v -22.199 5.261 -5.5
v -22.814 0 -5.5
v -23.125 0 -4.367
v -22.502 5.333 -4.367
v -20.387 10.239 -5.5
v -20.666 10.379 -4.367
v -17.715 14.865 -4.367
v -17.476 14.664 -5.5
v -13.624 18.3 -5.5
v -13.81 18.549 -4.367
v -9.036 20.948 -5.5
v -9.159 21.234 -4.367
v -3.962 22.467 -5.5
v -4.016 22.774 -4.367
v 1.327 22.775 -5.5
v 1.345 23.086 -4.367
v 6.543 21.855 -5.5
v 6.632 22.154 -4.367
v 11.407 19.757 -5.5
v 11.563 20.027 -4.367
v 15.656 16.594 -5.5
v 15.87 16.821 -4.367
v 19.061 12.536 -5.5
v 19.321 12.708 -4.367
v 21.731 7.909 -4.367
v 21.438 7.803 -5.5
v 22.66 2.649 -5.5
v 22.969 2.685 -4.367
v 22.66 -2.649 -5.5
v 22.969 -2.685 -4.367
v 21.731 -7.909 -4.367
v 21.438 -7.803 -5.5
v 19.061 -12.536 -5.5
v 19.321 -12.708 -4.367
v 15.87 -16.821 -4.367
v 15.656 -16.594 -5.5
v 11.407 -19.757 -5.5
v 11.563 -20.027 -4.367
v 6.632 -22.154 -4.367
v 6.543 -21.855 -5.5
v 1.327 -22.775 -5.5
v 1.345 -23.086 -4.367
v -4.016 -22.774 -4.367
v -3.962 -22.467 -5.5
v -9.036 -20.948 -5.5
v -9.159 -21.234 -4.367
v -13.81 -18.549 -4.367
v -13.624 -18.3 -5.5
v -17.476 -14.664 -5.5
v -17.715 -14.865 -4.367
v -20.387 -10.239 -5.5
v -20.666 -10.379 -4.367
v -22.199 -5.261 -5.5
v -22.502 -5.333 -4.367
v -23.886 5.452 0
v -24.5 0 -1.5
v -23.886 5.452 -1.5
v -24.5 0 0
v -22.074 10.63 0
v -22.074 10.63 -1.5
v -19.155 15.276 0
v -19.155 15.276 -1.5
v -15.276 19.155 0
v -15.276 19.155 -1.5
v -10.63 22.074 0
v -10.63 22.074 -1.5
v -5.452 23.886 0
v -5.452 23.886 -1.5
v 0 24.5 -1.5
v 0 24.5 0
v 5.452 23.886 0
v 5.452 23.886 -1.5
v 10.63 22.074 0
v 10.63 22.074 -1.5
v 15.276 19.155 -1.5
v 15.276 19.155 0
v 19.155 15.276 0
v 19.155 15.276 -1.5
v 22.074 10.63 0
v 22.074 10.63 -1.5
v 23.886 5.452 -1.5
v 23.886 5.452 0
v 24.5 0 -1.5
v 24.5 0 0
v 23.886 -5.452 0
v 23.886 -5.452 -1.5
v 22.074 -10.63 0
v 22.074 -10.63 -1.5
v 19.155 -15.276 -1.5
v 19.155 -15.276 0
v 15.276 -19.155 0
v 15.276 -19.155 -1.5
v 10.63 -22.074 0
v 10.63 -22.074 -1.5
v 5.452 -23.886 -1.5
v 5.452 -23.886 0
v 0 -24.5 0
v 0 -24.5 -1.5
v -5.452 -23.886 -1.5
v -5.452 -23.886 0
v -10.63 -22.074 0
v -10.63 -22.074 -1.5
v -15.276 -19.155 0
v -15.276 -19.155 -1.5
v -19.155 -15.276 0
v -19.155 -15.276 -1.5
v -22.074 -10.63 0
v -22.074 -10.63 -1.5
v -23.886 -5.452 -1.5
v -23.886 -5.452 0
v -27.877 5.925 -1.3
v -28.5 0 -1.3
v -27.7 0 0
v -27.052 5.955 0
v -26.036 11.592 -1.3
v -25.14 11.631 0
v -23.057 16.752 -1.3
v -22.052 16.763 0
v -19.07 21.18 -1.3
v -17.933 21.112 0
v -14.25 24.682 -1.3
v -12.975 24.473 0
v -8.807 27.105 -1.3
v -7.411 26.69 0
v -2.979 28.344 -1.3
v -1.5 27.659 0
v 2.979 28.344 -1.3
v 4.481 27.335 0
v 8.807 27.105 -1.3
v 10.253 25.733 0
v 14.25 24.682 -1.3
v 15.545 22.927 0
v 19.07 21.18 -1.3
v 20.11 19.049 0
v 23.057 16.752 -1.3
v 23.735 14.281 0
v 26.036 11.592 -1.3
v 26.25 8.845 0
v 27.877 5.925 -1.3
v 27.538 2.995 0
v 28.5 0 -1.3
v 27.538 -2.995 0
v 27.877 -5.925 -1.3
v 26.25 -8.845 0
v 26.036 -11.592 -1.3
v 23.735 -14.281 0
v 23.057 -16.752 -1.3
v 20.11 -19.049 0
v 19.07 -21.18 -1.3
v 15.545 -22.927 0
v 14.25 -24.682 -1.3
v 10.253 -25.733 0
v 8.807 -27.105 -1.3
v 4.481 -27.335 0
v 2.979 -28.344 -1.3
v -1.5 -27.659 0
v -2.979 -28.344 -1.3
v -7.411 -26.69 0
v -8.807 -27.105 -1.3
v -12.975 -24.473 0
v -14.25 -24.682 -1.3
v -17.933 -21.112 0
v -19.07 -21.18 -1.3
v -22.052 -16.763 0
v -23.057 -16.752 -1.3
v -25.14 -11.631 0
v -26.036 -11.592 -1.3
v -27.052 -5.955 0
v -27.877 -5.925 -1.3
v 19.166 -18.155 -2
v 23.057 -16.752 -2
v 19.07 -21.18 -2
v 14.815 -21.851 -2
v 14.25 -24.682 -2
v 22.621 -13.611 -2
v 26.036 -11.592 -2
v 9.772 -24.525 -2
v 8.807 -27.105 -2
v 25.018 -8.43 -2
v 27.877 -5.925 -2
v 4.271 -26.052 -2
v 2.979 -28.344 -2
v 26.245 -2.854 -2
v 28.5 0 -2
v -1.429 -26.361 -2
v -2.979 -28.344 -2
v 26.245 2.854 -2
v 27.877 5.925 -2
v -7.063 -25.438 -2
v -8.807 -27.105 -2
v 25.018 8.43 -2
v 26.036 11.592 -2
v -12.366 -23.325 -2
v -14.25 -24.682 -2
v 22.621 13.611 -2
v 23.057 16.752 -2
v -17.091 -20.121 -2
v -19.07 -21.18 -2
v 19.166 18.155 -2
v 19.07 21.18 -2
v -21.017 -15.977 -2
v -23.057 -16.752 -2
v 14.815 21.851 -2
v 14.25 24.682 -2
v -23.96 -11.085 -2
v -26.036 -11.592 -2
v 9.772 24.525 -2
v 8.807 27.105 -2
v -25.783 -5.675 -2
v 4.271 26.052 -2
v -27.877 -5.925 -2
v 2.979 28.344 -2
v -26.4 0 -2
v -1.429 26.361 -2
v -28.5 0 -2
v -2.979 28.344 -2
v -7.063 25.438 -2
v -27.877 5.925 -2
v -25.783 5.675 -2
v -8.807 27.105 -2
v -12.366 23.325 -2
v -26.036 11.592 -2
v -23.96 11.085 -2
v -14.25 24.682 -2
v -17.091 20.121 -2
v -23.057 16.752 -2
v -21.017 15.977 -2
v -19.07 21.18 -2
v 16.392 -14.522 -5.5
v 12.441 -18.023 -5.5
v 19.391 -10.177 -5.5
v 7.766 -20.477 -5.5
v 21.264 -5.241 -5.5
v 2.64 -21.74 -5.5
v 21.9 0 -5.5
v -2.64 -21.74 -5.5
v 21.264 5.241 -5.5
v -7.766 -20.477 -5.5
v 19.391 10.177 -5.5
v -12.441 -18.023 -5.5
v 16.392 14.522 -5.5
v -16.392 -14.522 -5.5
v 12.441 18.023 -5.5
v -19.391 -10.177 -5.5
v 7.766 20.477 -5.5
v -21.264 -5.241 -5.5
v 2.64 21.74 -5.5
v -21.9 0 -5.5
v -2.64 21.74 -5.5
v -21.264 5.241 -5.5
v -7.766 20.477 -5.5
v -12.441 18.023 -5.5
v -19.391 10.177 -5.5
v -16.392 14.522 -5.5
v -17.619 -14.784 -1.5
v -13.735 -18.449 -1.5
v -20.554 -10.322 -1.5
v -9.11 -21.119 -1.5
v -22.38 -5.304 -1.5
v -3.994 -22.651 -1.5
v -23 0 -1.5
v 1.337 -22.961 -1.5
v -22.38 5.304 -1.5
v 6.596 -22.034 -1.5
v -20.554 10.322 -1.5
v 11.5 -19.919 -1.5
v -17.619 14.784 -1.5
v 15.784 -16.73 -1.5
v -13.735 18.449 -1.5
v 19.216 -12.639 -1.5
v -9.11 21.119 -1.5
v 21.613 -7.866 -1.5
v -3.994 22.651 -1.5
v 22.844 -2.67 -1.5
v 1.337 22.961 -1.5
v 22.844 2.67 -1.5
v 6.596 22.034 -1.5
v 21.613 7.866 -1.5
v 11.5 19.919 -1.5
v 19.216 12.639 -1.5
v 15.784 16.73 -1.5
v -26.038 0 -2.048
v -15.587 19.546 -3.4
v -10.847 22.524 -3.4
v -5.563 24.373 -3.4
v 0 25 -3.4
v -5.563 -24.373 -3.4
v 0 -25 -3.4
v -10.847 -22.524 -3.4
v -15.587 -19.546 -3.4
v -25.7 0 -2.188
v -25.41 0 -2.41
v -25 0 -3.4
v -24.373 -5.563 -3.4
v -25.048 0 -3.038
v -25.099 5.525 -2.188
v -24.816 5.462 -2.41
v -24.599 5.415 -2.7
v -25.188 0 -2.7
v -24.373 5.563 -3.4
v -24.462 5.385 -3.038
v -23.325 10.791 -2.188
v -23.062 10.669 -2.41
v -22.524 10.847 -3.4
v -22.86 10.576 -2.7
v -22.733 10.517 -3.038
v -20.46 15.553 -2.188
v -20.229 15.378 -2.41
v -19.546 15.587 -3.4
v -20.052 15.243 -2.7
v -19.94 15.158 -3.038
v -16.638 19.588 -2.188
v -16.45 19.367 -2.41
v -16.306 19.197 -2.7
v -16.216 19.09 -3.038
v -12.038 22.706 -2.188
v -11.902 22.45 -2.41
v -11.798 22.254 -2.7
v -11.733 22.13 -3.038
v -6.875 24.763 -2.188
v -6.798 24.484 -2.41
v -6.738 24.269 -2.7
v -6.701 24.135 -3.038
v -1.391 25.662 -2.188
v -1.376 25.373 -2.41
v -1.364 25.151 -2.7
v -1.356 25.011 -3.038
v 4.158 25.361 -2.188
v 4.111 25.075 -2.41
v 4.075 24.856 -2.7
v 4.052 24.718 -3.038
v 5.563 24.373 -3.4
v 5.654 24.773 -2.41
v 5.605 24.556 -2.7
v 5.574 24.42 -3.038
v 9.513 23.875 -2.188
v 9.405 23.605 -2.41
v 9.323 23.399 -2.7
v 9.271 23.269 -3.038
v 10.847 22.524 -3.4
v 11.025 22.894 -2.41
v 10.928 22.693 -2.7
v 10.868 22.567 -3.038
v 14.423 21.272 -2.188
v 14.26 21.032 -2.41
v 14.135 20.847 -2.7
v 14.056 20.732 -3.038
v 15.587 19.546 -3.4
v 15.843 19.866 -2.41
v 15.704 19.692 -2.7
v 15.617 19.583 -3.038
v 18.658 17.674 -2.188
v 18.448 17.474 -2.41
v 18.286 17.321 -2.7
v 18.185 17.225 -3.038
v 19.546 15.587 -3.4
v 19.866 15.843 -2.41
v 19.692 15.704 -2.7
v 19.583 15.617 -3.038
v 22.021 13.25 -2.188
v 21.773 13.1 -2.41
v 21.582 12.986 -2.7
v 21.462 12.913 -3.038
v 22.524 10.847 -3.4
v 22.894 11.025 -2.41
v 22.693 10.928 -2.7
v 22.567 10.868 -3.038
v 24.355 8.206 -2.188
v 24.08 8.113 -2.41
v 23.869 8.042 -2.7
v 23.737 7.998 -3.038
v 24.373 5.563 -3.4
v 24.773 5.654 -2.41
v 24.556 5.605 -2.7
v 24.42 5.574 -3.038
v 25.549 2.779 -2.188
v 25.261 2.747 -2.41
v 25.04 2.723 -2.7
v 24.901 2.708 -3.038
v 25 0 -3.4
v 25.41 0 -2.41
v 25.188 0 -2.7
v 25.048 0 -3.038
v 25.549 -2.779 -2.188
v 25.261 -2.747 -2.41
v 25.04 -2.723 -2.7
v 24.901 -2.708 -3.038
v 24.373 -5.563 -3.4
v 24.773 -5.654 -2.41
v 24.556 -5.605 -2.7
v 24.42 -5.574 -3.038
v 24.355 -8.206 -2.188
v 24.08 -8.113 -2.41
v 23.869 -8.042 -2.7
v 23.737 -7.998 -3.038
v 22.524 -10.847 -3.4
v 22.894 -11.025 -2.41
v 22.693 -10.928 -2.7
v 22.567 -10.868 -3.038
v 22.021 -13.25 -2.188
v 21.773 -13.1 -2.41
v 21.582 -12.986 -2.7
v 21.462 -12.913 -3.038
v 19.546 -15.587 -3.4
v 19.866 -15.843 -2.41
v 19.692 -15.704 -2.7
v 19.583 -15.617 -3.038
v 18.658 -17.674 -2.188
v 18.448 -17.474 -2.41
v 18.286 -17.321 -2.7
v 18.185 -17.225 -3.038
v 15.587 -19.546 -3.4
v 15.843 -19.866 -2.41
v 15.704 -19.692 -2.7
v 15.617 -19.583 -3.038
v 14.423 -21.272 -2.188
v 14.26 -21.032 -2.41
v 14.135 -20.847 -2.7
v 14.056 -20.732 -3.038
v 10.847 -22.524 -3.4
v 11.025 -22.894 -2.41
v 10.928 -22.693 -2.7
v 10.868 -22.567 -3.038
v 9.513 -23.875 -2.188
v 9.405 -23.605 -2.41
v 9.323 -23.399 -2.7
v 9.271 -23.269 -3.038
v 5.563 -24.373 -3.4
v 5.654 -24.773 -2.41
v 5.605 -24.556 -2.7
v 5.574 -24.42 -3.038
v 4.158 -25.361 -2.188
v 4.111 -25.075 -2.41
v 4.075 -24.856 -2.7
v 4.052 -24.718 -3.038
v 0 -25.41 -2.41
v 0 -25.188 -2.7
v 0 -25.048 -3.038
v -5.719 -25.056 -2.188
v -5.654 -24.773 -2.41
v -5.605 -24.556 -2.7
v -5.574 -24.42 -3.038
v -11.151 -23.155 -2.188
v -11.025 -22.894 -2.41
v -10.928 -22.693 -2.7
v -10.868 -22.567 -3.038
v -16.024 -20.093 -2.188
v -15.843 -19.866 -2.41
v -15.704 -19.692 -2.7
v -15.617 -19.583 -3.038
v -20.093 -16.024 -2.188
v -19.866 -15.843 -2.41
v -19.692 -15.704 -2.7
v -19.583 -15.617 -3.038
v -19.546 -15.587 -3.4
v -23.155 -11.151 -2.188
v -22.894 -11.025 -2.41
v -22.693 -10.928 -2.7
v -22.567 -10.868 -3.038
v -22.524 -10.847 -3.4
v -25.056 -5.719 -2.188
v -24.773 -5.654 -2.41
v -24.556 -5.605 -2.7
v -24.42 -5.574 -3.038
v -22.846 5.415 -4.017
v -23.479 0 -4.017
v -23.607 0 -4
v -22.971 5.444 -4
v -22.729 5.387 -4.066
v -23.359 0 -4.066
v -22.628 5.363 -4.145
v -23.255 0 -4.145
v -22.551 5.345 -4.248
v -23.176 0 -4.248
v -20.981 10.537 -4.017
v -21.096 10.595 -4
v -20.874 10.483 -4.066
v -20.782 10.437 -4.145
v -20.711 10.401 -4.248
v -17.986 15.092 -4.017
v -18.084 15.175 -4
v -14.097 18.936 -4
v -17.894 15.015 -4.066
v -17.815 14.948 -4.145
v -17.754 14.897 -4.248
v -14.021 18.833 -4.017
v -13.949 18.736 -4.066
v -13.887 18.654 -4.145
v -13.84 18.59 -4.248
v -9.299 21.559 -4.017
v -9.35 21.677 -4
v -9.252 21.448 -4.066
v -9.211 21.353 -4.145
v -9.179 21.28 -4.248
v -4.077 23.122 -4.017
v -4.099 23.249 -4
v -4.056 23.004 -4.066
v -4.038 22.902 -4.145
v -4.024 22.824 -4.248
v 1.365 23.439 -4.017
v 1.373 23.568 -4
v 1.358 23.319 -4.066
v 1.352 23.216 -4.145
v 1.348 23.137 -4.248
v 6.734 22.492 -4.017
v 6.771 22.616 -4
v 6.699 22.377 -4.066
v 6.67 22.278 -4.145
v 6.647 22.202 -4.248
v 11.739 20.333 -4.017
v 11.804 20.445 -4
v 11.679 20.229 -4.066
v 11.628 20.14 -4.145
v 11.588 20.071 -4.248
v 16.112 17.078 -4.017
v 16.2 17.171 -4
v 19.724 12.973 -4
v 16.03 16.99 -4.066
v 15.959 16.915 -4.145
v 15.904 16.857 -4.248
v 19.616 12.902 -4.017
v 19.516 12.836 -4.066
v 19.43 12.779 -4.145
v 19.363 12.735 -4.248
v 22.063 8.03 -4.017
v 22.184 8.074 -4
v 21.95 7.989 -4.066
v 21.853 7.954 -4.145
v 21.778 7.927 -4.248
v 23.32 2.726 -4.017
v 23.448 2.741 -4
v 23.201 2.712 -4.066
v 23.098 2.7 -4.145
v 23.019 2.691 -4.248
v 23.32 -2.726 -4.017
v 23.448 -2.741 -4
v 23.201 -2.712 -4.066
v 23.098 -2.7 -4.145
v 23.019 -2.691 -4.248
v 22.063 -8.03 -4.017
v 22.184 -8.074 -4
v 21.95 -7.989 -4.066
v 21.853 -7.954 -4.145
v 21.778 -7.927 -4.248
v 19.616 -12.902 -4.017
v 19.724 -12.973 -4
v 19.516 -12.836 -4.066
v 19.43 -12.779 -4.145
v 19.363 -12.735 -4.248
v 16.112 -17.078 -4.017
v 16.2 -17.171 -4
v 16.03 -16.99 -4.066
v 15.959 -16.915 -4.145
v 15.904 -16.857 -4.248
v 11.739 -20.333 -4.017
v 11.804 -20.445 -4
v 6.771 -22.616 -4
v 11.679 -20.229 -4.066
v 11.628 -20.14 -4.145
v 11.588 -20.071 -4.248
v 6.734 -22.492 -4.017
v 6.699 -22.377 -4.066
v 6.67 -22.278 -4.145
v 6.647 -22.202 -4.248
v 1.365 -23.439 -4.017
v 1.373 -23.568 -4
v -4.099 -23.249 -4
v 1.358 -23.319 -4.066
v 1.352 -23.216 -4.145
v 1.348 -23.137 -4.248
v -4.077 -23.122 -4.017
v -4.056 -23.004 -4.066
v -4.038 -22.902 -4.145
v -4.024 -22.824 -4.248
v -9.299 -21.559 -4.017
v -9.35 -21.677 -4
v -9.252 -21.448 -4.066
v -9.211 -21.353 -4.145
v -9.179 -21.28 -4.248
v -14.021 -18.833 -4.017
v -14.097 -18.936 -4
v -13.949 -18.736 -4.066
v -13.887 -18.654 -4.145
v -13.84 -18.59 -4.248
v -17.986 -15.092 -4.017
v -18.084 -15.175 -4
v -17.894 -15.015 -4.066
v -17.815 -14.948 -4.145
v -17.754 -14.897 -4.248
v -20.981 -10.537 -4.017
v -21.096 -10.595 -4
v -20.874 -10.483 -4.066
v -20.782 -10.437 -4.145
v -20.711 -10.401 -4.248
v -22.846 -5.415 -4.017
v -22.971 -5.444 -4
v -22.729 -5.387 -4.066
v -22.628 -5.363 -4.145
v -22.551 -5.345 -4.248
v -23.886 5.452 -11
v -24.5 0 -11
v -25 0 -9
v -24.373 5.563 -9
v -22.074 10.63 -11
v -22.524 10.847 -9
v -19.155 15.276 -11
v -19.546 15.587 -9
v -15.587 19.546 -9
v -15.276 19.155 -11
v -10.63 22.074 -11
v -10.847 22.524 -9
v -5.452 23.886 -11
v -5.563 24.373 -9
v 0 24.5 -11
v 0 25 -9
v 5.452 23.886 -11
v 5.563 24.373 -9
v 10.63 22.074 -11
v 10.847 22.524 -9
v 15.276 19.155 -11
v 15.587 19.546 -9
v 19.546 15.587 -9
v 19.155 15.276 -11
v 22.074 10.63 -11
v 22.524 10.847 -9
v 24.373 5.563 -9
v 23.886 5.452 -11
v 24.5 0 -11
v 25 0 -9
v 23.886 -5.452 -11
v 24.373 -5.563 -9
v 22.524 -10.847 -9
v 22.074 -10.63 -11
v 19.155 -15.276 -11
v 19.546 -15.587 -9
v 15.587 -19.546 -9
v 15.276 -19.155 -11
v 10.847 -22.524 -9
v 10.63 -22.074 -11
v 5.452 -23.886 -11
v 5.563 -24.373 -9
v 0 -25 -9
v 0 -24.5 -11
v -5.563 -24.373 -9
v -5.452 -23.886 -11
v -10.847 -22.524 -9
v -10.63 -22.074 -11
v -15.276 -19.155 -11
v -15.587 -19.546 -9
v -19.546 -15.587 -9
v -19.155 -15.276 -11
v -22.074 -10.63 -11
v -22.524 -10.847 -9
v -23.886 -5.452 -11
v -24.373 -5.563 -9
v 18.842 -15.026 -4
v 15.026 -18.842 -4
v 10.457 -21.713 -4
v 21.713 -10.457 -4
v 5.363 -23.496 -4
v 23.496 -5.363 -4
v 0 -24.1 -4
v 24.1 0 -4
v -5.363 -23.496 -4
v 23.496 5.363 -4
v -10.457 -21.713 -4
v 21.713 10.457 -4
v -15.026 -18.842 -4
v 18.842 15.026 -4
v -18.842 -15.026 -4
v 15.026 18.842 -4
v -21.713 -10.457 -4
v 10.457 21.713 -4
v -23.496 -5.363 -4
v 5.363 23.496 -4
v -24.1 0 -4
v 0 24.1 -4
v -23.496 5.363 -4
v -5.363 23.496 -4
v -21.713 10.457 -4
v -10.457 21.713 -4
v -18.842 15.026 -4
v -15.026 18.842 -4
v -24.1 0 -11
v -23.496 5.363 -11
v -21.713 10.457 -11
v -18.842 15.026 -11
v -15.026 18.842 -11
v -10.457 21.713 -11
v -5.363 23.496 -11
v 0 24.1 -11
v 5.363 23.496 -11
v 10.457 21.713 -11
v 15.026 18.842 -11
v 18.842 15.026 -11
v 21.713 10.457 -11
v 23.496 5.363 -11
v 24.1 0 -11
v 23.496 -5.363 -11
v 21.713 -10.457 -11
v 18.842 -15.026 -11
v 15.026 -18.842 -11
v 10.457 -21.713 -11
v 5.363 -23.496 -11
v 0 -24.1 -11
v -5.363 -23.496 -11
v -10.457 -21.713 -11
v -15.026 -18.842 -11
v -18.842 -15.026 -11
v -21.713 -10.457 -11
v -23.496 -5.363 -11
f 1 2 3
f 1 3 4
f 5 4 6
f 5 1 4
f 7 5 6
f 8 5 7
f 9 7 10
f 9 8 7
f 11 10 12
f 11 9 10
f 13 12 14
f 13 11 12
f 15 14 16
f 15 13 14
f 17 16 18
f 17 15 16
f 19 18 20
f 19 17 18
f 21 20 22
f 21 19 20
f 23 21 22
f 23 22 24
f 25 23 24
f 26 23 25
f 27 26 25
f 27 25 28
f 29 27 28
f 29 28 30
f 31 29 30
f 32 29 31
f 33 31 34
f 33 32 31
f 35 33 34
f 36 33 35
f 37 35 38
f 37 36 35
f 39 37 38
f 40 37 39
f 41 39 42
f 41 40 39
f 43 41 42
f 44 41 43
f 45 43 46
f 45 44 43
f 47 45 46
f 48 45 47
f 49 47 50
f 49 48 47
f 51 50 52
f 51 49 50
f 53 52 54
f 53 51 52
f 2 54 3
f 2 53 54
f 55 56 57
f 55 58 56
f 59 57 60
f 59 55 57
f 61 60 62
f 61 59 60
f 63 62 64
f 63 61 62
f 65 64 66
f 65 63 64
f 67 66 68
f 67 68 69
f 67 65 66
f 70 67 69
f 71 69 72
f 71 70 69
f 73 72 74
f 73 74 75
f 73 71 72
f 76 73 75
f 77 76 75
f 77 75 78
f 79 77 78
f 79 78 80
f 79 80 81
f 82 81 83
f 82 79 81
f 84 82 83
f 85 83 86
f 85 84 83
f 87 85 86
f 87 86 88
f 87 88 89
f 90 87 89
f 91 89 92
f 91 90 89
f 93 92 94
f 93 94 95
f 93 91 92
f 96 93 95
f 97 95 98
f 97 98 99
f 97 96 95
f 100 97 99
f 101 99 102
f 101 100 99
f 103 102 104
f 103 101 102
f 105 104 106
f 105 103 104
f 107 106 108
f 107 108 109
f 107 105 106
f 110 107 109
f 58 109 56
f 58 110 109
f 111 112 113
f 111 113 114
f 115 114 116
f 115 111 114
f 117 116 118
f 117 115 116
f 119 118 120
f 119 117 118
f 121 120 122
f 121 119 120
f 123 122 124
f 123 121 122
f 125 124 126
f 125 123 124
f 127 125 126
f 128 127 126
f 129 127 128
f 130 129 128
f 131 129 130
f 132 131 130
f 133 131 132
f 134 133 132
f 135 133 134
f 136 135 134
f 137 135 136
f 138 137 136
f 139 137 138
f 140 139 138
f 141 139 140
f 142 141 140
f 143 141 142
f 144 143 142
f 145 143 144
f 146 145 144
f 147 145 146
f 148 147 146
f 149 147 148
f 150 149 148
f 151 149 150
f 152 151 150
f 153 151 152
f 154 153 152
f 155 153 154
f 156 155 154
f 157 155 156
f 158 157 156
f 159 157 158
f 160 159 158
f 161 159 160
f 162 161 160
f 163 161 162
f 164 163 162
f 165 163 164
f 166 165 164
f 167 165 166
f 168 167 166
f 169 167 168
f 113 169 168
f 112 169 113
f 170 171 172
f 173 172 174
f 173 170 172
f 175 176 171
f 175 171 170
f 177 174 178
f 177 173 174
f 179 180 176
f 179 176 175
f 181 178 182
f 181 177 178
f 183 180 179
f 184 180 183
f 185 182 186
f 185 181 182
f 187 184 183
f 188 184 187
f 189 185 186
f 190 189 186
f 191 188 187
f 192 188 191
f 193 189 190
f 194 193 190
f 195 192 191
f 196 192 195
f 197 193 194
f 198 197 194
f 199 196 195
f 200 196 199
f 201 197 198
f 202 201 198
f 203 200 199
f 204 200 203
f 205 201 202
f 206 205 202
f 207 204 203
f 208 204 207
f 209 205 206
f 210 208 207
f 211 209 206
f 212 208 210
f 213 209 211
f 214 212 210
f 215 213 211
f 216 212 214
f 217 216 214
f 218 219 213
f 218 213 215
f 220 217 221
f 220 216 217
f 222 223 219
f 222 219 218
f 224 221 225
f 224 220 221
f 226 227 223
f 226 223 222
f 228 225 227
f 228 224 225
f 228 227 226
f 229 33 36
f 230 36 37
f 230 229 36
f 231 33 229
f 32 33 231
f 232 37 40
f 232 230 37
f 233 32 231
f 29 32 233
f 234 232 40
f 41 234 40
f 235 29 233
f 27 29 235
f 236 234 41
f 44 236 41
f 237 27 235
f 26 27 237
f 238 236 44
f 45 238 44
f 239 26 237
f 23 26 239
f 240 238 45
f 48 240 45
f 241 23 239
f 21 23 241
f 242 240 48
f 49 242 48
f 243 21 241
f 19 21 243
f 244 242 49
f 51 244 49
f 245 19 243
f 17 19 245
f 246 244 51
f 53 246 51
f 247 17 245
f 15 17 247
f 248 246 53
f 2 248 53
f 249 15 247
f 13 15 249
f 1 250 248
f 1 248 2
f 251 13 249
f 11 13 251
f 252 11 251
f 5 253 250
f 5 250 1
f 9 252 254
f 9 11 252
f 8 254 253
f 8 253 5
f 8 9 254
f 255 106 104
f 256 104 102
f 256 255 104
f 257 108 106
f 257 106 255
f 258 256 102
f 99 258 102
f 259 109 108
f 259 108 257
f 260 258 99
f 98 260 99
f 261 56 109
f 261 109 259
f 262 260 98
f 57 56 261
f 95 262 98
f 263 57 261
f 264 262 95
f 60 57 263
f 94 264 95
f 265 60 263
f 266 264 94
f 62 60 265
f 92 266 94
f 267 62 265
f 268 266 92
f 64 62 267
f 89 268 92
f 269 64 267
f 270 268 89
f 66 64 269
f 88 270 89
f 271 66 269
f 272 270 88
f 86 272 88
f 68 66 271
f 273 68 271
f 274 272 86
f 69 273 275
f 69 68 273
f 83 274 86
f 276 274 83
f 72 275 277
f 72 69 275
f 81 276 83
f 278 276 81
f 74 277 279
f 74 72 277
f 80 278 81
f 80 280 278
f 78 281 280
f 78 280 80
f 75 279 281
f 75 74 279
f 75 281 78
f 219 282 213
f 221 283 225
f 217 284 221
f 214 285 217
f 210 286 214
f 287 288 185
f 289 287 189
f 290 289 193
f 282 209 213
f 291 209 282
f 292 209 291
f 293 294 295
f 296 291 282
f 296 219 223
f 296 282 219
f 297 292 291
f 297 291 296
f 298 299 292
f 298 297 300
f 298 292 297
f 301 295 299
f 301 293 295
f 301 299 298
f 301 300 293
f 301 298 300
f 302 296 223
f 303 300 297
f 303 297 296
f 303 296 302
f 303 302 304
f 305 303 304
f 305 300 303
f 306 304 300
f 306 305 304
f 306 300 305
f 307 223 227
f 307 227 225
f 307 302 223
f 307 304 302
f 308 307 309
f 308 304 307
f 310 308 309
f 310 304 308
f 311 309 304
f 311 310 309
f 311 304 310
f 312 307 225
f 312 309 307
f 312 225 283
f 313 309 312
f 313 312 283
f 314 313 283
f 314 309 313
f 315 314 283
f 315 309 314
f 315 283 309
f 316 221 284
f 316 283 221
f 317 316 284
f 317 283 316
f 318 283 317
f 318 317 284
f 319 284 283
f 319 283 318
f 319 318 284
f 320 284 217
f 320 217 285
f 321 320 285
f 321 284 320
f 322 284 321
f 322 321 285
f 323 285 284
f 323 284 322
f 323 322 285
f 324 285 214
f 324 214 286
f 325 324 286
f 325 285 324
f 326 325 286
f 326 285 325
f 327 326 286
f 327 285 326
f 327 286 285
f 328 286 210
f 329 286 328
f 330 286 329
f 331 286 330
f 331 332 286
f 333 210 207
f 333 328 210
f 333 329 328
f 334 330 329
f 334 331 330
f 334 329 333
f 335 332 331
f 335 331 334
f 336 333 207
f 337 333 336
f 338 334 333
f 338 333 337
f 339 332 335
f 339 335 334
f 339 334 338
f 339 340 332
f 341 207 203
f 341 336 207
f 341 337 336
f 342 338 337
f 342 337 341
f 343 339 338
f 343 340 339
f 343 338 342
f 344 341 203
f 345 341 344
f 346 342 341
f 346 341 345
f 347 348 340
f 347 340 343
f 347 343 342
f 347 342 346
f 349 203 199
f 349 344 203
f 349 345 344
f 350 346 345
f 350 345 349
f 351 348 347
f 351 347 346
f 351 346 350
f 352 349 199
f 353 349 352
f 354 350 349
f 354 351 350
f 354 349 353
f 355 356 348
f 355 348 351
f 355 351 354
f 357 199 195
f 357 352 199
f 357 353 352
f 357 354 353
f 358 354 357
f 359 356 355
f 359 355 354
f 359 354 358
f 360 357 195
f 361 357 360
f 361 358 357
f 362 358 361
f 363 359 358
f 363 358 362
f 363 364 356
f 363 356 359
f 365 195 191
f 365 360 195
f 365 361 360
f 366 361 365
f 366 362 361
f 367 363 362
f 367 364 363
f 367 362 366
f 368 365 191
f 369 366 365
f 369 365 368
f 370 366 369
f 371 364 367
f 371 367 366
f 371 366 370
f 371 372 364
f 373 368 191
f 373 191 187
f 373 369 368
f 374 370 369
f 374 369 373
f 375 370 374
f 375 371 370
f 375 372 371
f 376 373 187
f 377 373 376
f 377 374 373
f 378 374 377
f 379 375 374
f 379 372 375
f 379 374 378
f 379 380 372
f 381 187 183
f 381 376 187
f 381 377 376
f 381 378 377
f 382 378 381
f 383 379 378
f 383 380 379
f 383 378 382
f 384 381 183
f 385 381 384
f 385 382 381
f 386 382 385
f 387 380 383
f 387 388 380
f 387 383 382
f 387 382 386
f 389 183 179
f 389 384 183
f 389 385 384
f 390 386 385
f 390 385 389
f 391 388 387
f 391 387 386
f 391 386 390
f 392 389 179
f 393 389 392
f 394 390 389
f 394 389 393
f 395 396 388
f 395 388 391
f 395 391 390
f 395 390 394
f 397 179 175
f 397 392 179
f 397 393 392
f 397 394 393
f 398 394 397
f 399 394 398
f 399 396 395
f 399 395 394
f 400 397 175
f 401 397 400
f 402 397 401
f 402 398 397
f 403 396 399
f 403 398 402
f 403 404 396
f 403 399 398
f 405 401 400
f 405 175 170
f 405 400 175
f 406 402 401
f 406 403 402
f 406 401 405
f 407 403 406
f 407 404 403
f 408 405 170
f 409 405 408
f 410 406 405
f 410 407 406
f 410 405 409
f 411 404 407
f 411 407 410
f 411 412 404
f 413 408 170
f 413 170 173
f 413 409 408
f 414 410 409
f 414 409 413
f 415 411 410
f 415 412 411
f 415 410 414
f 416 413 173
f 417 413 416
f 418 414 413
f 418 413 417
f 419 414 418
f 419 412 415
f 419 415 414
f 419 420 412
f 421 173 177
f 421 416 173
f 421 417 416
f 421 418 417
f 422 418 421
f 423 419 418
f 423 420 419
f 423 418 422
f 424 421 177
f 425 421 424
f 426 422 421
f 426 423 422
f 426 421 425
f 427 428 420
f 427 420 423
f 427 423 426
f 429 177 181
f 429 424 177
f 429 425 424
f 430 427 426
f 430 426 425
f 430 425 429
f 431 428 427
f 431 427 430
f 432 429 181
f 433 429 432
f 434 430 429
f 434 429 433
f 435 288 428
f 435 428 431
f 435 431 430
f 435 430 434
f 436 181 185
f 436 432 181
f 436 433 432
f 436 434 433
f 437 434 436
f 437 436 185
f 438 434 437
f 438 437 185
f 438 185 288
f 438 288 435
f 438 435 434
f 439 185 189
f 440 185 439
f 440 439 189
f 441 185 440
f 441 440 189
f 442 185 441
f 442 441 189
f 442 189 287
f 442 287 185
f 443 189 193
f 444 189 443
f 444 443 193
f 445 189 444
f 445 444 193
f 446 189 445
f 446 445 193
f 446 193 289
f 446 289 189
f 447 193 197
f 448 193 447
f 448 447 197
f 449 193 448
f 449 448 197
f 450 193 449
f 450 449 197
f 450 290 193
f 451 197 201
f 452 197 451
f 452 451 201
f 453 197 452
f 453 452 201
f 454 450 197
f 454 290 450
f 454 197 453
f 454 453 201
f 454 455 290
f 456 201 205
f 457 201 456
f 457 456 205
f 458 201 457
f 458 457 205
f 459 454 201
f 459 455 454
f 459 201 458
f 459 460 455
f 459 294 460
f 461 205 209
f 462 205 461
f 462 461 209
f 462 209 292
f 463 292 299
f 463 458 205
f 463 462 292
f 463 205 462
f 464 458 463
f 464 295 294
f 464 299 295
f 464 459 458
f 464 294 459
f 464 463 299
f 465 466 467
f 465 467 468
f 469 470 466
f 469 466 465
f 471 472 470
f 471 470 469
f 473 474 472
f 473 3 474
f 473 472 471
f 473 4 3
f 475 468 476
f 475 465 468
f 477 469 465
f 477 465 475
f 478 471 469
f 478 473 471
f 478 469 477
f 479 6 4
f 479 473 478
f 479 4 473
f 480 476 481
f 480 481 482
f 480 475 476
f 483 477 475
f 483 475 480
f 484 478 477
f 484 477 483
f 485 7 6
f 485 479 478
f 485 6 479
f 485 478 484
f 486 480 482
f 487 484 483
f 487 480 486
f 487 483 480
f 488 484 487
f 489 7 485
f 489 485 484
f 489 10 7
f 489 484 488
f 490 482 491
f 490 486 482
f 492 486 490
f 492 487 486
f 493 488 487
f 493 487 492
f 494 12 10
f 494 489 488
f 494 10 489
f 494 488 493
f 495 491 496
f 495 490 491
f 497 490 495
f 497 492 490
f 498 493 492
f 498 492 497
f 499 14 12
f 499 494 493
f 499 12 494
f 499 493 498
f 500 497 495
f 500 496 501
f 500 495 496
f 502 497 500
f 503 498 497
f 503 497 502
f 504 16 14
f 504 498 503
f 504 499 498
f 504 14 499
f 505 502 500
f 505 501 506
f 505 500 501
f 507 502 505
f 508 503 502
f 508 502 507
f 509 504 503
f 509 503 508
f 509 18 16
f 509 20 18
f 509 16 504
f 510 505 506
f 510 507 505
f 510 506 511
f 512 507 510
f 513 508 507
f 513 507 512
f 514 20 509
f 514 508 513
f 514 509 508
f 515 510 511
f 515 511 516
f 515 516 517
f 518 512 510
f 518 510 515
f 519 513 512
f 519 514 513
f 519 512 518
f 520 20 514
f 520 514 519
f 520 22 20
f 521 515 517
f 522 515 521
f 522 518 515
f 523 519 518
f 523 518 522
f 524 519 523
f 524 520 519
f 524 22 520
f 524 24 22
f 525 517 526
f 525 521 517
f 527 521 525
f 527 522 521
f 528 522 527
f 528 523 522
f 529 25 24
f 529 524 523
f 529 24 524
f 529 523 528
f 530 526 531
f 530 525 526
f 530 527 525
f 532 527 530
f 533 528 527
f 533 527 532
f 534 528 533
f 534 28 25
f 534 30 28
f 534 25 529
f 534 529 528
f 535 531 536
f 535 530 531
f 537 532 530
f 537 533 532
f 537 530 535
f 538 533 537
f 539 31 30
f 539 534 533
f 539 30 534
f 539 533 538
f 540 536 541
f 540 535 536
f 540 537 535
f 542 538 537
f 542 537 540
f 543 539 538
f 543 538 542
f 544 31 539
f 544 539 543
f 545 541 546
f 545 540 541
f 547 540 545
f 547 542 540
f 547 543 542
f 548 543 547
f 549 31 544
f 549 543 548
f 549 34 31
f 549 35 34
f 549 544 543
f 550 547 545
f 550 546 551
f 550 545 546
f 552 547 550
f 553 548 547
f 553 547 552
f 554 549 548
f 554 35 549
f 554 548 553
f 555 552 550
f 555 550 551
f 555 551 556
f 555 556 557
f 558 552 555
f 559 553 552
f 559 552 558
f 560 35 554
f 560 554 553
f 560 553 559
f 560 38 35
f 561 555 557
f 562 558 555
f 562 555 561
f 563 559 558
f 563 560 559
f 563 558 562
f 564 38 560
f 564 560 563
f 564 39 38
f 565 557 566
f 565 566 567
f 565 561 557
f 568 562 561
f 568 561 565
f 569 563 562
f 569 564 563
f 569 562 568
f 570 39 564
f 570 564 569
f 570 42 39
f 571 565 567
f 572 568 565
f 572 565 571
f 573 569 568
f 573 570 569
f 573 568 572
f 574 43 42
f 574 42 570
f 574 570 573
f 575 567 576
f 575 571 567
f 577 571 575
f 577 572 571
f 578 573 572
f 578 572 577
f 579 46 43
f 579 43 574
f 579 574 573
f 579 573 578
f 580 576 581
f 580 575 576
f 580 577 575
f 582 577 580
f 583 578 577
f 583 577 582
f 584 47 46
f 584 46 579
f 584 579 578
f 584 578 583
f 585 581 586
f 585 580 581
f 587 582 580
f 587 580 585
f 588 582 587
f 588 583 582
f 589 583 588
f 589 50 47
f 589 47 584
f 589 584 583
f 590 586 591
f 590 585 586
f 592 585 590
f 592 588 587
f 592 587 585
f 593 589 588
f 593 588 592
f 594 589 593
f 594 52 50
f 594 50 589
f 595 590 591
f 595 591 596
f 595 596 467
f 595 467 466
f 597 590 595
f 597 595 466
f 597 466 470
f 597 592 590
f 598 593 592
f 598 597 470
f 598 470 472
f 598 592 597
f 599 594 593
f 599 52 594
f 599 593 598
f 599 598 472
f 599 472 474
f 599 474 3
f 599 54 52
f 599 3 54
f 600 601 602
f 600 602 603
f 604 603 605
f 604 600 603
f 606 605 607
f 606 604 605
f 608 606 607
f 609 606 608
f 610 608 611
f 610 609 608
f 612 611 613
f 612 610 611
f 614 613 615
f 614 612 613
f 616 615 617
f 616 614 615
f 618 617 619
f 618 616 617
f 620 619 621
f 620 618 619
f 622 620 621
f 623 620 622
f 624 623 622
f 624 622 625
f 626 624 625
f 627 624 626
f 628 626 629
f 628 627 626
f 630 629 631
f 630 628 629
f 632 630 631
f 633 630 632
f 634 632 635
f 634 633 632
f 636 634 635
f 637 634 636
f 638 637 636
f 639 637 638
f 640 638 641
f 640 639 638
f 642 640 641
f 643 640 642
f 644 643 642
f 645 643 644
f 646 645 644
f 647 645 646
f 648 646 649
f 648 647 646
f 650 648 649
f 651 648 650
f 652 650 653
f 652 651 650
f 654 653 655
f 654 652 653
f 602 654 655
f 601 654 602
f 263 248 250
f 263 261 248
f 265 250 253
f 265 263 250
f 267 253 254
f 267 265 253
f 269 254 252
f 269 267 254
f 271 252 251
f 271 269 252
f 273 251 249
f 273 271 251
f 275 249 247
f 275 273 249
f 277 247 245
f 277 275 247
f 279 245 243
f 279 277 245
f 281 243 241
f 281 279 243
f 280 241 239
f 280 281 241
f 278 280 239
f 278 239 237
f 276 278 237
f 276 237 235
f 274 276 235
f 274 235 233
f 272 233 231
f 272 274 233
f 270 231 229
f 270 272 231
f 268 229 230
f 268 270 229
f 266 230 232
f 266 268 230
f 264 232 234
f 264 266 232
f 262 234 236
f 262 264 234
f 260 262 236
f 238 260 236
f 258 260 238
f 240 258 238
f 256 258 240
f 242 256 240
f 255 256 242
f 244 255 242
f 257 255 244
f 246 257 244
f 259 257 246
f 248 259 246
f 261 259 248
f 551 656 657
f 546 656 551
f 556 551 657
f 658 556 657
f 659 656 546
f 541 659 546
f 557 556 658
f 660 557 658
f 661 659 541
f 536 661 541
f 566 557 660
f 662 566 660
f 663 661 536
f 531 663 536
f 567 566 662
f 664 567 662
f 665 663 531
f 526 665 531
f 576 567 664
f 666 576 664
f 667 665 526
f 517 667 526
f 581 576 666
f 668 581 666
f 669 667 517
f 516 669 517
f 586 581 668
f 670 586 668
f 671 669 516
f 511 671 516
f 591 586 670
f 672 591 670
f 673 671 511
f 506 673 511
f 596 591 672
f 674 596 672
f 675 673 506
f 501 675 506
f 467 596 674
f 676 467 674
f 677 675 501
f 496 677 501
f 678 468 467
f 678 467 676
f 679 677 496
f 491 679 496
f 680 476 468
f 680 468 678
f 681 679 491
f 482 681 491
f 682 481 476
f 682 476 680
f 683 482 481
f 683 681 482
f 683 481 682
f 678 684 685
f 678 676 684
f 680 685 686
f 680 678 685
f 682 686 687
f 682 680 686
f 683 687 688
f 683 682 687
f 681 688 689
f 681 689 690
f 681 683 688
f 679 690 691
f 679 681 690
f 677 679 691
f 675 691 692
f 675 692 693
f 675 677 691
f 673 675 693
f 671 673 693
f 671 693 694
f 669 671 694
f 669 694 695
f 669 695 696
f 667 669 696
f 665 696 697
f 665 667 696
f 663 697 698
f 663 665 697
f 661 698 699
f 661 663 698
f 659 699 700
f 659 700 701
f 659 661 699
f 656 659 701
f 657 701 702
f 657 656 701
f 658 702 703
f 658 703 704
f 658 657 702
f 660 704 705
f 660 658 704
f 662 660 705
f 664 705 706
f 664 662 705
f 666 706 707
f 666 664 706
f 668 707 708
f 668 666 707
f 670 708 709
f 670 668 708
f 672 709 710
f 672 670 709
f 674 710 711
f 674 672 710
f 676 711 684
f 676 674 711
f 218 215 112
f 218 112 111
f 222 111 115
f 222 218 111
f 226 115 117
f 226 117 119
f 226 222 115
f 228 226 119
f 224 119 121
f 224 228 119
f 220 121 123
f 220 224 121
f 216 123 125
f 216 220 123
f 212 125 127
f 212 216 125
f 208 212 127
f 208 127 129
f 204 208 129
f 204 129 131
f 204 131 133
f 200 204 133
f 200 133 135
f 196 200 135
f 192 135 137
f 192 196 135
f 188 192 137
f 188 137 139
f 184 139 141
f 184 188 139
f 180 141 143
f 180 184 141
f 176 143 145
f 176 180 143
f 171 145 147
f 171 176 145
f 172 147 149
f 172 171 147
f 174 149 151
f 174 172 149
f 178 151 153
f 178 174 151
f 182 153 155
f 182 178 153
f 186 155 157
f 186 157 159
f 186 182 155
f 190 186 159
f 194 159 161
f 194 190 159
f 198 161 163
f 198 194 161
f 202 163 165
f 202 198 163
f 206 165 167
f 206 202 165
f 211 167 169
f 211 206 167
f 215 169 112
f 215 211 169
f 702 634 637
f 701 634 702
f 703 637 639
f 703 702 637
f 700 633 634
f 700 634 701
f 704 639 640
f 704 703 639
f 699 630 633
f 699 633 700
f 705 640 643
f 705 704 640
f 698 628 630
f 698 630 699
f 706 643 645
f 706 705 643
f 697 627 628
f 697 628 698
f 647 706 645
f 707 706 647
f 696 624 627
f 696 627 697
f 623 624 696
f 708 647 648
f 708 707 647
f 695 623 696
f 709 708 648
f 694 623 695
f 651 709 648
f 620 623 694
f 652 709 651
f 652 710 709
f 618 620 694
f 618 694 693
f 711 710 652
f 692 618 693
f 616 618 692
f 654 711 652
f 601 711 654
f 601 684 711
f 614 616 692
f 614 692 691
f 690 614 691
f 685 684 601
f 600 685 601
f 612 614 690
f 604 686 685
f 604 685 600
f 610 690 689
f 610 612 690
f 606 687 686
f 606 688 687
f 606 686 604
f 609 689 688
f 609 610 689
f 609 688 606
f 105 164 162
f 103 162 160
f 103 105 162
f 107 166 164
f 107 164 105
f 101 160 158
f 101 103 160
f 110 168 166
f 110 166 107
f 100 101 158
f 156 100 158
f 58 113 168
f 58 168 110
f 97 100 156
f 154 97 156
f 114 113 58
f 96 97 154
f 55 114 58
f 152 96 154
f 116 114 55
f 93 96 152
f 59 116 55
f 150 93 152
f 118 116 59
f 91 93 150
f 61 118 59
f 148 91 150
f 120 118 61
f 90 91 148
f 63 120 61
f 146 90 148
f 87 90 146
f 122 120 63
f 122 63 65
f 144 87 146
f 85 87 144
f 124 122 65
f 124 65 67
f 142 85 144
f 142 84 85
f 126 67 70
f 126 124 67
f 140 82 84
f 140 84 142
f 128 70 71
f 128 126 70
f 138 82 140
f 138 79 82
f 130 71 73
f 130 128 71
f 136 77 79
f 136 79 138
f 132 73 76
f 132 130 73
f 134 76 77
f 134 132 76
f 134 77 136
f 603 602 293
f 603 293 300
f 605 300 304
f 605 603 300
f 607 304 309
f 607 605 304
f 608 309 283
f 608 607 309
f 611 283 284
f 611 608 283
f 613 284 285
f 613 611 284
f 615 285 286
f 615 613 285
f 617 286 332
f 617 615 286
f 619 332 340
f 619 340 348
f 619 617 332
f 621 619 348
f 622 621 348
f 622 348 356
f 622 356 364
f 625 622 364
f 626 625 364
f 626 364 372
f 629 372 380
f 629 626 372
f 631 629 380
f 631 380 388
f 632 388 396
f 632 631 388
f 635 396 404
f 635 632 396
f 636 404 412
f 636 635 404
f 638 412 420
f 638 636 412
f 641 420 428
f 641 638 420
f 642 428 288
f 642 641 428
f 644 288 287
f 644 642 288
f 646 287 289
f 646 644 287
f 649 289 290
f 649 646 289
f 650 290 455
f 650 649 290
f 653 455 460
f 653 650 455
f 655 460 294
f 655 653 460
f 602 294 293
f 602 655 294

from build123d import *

# Parameters (mm, degrees)
F2_SIZE2 = 1.3
F2_SIZE  = 0.8
F3_R     = 1.4
F4_SIZE2 = 0.5
F4_SIZE  = 2
F5_R     = 0.5


with BuildPart() as f1:
    # F0 (on Front) → F1 (revolve)
    with BuildSketch(Plane.XZ):
        Polygon((-24.5, 0), (-28.5, 0), (-28.5, -2), (-25, -2), (-25, -11), (-24.1, -11), (-24.1, -4), (-23.226406, -4), (-22.813906, -5.5), (-21.9, -5.5), (-23, -1.5), (-24.5, -1.5), align=None)
    revolve(axis=Axis((0, 0, 1.068981), (0, 0, -1)))

    # F2
    f2_edges = [f1.edges().sort_by_distance(p)[0] for p in [
        (28.5, 0, 0),
    ]]
    chamfer(f2_edges, length=F2_SIZE, length2=F2_SIZE2)

    # F3
    f3_edges = [f1.edges().sort_by_distance(p)[0] for p in [
        (25, 0, -2),
    ]]
    fillet(f3_edges, radius=F3_R)

    # F4
    f4_edges = [f1.edges().sort_by_distance(p)[0] for p in [
        (25, 0, -11),
    ]]
    chamfer(f4_edges, length=F4_SIZE, length2=F4_SIZE2)

    # F5
    f5_edges = [f1.edges().sort_by_distance(p)[0] for p in [
        (23.226406, 0, -4),
    ]]
    fillet(f5_edges, radius=F5_R)


solid = f1.part
